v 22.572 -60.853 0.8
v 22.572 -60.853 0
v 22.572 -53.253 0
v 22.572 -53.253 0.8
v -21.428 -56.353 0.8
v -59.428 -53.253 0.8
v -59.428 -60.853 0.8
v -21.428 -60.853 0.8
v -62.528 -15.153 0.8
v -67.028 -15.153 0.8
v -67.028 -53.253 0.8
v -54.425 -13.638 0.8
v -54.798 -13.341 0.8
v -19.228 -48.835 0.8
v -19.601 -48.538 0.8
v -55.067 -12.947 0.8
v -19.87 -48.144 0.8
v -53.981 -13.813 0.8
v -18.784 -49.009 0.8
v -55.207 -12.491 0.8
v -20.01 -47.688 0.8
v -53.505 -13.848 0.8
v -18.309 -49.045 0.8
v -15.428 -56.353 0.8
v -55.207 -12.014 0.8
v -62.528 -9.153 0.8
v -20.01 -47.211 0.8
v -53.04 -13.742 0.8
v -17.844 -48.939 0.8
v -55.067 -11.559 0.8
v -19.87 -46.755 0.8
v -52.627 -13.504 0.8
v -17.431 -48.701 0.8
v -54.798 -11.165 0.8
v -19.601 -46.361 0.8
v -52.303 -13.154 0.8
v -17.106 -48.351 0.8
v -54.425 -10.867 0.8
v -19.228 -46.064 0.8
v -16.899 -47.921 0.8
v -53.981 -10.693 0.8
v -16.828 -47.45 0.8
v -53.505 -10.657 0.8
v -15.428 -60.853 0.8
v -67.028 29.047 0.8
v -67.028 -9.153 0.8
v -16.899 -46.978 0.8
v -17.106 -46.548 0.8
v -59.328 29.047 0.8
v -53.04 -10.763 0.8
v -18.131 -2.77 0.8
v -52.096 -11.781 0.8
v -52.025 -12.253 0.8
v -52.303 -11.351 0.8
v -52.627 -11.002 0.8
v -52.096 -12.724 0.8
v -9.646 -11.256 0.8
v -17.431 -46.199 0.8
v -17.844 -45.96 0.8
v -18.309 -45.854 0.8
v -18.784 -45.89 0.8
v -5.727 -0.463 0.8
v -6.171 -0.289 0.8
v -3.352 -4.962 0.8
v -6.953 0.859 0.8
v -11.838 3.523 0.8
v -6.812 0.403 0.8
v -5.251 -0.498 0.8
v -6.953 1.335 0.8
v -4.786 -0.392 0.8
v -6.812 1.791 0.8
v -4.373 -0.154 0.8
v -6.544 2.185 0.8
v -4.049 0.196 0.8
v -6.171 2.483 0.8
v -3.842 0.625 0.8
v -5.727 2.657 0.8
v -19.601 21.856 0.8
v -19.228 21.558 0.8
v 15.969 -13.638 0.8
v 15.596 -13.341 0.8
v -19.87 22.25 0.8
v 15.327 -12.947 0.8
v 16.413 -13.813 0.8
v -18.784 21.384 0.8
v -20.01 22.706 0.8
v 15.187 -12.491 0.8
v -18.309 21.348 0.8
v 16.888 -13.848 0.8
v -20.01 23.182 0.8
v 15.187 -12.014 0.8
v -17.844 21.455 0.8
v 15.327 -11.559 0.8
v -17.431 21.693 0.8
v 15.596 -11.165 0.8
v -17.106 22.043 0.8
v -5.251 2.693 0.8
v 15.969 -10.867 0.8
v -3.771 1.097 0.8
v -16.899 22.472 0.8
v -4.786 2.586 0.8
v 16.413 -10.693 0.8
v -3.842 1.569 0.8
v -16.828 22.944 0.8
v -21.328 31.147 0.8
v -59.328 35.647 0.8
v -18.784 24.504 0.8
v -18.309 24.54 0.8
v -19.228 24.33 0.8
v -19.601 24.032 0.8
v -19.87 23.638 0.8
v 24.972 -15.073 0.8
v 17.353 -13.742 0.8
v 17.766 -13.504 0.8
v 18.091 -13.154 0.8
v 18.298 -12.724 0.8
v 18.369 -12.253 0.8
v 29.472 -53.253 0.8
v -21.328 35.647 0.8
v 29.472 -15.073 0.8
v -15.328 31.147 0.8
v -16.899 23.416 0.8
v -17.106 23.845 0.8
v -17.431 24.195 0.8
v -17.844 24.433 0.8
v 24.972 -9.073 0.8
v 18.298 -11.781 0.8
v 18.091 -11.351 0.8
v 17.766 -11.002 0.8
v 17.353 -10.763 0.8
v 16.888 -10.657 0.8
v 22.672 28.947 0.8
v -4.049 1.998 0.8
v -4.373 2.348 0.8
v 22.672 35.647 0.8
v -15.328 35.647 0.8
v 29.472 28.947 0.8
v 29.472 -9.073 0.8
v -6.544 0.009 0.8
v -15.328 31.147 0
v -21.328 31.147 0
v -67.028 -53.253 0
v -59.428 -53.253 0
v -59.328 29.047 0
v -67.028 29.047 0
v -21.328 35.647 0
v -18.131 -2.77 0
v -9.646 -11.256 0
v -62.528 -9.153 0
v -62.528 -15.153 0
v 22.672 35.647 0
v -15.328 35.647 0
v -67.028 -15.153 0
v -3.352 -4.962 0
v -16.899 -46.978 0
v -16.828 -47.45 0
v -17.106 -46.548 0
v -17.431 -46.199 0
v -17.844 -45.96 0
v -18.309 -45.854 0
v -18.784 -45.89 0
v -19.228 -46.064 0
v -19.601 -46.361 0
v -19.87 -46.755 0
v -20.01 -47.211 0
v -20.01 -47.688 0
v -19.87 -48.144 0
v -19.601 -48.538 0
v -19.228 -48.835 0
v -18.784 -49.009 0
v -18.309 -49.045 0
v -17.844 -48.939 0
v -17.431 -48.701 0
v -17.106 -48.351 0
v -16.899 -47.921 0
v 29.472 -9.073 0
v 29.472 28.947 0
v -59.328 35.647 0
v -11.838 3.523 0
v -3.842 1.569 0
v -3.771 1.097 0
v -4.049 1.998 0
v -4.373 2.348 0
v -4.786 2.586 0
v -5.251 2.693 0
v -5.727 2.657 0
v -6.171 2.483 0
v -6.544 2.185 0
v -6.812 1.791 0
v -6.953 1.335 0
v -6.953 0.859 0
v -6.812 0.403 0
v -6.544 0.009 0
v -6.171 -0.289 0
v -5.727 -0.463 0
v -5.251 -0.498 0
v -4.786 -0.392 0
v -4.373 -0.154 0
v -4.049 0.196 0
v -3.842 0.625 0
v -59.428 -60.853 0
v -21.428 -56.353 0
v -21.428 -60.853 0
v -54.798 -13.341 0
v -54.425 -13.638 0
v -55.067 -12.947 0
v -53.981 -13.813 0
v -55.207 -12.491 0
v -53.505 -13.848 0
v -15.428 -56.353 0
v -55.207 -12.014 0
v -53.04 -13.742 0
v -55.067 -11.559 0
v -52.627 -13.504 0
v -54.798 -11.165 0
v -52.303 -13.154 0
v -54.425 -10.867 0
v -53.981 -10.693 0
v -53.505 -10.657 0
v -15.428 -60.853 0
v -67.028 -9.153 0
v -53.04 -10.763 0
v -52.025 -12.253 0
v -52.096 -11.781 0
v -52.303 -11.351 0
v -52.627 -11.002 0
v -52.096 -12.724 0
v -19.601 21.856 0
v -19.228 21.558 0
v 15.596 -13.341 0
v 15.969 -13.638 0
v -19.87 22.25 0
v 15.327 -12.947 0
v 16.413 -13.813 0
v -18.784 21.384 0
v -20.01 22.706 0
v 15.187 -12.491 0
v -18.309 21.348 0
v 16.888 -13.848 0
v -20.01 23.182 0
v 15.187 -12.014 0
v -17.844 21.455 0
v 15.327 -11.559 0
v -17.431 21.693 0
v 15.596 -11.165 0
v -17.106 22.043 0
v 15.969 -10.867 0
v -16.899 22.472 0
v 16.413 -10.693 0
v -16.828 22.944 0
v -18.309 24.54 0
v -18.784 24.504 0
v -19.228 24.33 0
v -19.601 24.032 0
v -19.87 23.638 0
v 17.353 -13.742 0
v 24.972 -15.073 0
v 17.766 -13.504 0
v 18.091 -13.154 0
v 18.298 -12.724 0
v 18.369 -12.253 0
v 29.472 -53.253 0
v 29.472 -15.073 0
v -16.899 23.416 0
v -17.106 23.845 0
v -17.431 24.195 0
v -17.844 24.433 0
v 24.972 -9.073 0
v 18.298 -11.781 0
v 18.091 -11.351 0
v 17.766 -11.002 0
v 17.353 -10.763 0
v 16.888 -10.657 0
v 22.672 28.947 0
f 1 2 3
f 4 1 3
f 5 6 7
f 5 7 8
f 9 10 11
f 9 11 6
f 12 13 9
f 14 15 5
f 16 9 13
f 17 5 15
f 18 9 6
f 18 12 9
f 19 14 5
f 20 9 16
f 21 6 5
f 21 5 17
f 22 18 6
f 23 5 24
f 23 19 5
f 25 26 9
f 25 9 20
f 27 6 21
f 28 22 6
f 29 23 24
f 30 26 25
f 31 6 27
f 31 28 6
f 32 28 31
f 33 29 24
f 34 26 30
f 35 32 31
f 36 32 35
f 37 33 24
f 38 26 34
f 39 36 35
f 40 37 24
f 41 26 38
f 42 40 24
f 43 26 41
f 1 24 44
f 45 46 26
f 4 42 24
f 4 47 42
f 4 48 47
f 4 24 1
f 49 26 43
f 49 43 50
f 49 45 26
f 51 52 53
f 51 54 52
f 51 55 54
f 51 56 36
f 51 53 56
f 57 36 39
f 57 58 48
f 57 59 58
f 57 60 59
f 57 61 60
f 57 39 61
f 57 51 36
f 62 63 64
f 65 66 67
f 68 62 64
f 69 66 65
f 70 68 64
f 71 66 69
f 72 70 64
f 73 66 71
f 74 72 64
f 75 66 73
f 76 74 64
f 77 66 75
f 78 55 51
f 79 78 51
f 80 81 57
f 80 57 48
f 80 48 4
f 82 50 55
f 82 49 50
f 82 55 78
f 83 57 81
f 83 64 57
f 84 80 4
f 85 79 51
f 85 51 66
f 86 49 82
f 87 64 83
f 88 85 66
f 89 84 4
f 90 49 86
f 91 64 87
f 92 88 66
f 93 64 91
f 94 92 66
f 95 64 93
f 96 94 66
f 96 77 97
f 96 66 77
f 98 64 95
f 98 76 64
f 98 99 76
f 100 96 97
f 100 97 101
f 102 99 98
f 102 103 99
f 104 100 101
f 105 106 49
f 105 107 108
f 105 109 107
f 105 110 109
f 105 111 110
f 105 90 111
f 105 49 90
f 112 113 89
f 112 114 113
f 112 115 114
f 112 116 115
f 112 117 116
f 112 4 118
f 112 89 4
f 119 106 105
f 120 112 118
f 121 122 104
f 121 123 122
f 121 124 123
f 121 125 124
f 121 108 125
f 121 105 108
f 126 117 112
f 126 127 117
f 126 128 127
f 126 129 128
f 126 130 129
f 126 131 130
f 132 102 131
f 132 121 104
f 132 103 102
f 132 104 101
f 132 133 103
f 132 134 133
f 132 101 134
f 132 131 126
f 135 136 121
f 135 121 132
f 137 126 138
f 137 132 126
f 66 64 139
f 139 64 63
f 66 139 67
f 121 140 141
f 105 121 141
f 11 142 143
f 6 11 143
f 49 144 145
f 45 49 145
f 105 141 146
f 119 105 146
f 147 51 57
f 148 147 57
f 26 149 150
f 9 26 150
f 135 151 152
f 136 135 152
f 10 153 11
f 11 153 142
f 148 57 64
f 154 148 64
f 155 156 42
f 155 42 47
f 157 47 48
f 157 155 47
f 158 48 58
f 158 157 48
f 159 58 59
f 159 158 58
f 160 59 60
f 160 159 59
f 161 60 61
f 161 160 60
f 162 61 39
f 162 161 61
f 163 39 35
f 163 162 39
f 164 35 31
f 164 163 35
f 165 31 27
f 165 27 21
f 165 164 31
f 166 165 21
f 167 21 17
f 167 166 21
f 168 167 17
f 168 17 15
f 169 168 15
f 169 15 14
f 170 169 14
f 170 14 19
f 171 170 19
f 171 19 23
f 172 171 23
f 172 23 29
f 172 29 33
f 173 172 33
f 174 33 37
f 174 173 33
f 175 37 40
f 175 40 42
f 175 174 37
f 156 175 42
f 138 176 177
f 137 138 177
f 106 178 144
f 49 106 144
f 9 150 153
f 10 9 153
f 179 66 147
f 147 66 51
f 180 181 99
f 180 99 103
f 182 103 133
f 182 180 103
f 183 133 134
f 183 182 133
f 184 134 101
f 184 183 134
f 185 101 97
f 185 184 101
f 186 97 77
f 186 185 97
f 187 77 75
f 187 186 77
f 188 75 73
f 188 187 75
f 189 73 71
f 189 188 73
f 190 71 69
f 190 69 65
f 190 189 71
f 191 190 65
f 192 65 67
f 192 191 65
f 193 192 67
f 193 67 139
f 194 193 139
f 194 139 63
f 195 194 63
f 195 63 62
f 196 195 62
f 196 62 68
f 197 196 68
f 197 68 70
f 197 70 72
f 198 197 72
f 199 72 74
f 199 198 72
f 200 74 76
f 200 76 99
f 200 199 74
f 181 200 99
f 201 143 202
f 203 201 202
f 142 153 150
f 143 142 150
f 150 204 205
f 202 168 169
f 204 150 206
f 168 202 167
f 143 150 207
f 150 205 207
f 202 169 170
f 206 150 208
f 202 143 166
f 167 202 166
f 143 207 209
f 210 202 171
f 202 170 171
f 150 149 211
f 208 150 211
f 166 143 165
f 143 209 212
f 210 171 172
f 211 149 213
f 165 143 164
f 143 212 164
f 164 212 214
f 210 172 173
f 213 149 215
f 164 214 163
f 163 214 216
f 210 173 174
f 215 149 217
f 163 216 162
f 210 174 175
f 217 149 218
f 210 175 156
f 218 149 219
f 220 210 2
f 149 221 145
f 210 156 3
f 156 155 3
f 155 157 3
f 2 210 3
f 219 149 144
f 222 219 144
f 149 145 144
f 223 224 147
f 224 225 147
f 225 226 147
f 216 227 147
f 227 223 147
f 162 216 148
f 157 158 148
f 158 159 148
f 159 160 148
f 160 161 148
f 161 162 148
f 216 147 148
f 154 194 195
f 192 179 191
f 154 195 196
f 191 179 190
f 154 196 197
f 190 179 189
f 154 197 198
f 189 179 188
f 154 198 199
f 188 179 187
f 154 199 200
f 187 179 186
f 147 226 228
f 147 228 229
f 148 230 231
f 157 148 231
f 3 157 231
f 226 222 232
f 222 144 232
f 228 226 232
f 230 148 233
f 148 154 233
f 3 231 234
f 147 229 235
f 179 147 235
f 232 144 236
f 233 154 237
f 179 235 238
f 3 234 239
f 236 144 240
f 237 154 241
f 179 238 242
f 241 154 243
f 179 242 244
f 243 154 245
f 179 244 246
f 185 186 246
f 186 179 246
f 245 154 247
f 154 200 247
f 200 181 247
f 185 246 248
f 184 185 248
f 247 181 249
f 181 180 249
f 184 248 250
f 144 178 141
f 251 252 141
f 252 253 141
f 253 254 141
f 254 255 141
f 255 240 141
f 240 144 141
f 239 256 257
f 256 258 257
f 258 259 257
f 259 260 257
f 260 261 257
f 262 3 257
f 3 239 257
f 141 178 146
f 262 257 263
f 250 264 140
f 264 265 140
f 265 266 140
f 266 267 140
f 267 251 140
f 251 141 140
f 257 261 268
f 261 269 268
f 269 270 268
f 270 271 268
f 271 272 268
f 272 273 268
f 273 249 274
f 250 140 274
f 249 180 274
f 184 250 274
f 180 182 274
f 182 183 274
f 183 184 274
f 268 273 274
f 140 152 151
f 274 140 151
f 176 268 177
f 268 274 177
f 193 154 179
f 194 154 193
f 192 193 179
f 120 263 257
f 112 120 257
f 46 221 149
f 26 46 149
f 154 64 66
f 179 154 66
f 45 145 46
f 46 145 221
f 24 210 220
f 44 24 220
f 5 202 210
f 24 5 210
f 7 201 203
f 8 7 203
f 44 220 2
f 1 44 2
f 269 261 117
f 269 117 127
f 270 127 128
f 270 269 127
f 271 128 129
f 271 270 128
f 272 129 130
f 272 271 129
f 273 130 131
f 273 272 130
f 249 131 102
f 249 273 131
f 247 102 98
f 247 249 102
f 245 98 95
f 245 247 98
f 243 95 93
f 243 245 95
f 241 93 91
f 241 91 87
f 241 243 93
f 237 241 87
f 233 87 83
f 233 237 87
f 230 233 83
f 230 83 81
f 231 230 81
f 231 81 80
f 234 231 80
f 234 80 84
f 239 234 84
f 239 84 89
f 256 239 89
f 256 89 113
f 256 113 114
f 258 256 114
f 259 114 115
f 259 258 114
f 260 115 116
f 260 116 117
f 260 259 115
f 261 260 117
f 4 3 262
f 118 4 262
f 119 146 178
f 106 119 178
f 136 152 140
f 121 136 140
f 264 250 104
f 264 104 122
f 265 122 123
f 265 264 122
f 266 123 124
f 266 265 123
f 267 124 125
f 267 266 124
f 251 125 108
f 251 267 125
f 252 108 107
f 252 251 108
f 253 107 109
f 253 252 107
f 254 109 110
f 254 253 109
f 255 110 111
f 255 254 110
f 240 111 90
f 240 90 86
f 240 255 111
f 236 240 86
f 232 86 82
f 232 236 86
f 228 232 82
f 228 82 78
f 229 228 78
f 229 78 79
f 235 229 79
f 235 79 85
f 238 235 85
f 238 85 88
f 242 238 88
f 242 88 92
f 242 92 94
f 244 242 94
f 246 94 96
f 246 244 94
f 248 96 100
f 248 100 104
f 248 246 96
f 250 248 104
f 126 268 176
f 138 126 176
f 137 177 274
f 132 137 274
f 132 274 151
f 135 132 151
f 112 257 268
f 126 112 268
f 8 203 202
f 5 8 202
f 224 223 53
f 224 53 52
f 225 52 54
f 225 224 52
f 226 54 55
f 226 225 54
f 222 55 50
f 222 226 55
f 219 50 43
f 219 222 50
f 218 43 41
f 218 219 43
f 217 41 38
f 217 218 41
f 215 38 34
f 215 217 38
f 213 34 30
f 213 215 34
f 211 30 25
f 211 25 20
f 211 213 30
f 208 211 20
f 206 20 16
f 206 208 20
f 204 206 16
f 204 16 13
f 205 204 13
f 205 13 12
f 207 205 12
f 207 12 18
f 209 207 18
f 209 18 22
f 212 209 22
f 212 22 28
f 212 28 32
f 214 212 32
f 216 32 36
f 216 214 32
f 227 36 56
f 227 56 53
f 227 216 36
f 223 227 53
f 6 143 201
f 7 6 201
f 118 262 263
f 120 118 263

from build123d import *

# Parameters (mm, degrees)
SKETCH1_R           = 1.6
BOSS_EXTRUDE1_DEPTH = 0.8
CUT_EXTRUDE1_DEPTH  = 0.8


with BuildPart() as part:
    # Sketch1 → Boss-Extrude1 (new body)
    with BuildSketch(Plane.XY):
        Polygon((-21.328326925, 35.64702685), (-59.328326925, 35.64702685), (-59.328326925, 29.04702685), (-67.028326925, 29.04702685), (-67.028326925, -9.15297315), (-62.528326925, -9.15297315), (-62.528326925, -15.15297315), (-67.028326925, -15.15297315), (-67.028326925, -53.25297315), (-59.428326925, -53.25297315), (-59.428326925, -60.85297315), (-21.428326925, -60.85297315), (-21.428326925, -56.35297315), (-15.428326925, -56.35297315), (-15.428326925, -60.85297315), (22.571673075, -60.85297315), (22.571673075, -53.25297315), (29.471673075, -53.25297315), (29.471673075, -15.073036827), (24.971673075, -15.073036827), (24.971673075, -9.073036827), (29.471673075, -9.073036827), (29.471673075, 28.94702685), (22.671673075, 28.94702685), (22.671673075, 35.64702685), (-15.328326925, 35.64702685), (-15.328326925, 31.14702685), (-21.328326925, 31.14702685), align=None)
        with Locations((-18.428147066, -47.449600232)):
            Circle(SKETCH1_R, mode=Mode.SUBTRACT)
        with Locations((-53.624954006, -12.252793292)):
            Circle(SKETCH1_R, mode=Mode.SUBTRACT)
        with Locations((-5.370945752, 1.09702685)):
            Circle(SKETCH1_R, mode=Mode.SUBTRACT)
        with Locations((16.768659873, -12.252793292)):
            Circle(SKETCH1_R, mode=Mode.SUBTRACT)
        with Locations((-18.428147066, 22.944013647)):
            Circle(SKETCH1_R, mode=Mode.SUBTRACT)
    extrude(amount=BOSS_EXTRUDE1_DEPTH)

    # Sketch2 → Cut-Extrude1 (cut)
    with BuildSketch(Plane.XY.offset(0.8)):
        Polygon((-7.935255139, -9.545182739), (-16.420536513, -1.059901365), (-18.130934836, -2.770299688), (-9.645653462, -11.255581062), align=None)
        Polygon((-5.036117336, -6.646044936), (-13.52139871, 1.839236438), (-16.420536513, -1.059901365), (-7.935255139, -9.545182739), align=None)
        Polygon((-3.35240311, -4.96233071), (-11.837684484, 3.522950664), (-13.52139871, 1.839236438), (-5.036117336, -6.646044936), align=None)
    extrude(amount=-CUT_EXTRUDE1_DEPTH, mode=Mode.SUBTRACT)


solid = part.part
